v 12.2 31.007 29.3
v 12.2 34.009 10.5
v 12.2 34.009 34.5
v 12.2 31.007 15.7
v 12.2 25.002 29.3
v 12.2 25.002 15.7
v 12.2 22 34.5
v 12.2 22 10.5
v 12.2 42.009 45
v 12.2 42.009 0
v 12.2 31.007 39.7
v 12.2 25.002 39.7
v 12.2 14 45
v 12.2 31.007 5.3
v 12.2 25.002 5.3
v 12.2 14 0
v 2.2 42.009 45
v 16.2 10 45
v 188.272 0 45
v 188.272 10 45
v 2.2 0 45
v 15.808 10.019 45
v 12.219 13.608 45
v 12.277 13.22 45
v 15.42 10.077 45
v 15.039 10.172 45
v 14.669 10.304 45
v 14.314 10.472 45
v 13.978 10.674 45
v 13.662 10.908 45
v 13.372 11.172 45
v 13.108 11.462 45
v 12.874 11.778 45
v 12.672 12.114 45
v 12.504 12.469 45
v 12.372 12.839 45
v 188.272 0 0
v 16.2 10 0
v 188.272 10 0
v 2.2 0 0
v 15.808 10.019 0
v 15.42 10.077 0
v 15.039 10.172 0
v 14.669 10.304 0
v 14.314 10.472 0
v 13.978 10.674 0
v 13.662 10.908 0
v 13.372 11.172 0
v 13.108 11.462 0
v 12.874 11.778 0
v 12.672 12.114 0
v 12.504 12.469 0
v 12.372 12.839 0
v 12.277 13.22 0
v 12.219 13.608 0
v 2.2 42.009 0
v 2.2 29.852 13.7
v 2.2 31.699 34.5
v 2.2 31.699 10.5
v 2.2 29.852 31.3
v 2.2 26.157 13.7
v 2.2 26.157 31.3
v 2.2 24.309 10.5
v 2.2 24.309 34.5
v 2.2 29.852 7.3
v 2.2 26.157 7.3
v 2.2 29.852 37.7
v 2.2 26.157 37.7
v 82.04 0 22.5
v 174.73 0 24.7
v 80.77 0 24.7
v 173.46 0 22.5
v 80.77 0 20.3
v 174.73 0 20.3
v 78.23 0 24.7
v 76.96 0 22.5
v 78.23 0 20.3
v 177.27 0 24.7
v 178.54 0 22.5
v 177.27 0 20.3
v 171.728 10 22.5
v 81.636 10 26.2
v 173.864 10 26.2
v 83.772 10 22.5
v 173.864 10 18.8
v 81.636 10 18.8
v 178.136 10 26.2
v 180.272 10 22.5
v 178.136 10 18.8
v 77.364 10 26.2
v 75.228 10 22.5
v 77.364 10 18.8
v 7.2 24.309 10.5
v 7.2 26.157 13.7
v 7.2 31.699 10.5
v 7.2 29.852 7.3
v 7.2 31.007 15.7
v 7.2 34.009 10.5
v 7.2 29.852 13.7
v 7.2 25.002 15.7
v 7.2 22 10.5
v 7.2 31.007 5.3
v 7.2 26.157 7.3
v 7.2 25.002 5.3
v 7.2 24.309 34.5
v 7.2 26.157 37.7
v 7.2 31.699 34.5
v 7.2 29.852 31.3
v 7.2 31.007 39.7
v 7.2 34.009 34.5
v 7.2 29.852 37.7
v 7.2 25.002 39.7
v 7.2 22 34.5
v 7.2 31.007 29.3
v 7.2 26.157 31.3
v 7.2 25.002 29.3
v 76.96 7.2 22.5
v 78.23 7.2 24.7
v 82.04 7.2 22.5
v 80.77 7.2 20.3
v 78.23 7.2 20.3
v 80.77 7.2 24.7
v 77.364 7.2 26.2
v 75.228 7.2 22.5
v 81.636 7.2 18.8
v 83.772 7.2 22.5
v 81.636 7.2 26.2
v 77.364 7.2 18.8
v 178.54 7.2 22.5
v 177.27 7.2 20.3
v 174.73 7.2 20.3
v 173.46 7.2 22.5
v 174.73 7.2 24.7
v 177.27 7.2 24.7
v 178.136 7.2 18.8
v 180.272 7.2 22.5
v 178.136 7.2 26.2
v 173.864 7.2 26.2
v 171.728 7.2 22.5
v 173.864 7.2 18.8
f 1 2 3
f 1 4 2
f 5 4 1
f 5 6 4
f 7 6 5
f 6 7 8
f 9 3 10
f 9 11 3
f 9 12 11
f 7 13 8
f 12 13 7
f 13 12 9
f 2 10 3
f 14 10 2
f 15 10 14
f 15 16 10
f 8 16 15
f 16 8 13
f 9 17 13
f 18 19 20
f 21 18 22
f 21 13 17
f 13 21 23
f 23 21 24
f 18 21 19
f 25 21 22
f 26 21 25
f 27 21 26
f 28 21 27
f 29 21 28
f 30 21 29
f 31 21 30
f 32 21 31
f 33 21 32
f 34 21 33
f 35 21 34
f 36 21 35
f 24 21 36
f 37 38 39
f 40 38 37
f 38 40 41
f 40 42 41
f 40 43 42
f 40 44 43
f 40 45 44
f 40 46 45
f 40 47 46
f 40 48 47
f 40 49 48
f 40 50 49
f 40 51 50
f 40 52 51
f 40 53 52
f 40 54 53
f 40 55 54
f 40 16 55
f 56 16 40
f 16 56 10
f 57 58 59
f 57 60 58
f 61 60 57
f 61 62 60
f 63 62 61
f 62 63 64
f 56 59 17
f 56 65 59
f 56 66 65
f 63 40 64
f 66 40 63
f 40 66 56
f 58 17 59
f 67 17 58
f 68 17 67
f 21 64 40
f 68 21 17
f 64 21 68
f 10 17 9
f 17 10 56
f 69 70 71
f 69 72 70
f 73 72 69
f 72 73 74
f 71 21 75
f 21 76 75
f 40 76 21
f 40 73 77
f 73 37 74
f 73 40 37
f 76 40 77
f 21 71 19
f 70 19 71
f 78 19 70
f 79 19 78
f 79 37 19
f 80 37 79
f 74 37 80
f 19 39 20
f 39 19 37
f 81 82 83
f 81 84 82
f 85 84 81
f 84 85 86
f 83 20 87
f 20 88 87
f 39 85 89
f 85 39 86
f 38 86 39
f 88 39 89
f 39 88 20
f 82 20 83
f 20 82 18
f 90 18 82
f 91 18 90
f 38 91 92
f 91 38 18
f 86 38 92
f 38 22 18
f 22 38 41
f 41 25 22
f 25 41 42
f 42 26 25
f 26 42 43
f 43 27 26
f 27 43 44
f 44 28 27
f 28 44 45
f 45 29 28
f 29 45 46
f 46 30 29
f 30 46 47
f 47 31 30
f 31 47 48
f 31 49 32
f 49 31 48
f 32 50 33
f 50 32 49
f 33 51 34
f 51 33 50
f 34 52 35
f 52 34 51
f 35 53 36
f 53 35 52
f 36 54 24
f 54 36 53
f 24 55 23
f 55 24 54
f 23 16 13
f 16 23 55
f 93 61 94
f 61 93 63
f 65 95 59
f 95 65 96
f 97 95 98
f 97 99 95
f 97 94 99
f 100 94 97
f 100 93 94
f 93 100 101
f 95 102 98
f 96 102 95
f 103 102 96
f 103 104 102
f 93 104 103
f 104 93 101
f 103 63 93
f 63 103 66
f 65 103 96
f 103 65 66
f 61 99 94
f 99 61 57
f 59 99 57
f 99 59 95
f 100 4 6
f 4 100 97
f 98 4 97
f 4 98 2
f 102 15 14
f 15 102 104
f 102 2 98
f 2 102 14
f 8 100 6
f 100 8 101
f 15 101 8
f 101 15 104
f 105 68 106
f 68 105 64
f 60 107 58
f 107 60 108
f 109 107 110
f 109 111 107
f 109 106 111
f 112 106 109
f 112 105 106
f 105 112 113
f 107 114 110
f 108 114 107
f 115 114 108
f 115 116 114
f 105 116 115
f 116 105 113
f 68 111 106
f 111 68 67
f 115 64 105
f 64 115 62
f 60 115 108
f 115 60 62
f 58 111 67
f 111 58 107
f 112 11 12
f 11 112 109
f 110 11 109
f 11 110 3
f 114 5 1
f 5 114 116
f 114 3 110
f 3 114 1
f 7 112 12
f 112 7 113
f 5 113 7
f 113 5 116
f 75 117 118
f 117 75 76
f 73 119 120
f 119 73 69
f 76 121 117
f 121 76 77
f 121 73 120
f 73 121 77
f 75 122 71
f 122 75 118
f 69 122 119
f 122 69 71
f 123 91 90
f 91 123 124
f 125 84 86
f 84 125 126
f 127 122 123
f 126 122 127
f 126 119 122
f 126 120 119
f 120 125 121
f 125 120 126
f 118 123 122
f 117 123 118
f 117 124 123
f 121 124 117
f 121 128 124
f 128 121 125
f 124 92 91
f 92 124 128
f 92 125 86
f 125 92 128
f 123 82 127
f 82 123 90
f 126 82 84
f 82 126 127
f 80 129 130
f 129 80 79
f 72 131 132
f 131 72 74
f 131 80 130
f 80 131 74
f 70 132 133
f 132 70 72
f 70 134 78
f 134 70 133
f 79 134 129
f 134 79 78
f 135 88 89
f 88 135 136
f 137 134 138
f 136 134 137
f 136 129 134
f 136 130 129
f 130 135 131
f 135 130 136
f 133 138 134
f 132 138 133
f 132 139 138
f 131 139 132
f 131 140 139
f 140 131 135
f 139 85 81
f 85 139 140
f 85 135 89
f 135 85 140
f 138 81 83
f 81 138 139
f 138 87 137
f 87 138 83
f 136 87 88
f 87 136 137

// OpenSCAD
// file: ../../../modules/steel_rack.scad
use <bolts.scad>;

bolt_edge_offset = 15;
bolt_positions = [
  bolt_edge_offset,
  bolt_edge_offset + 98,
  bolt_edge_offset + 98 + 24,
];

module bolt_and_nut(y, h) {
  nut_thickness = 5;
  translate([0, y, h / 2])
    m6_bolt_hole(h + 1, center = true);
  translate([0, y, h - nut_thickness / 2])
    rotate([0, 0, 90])
    m6_nut_trap(nut_thickness, center = true);
}

module long_bar(w, y, h) {
  difference() {
    translate([w / 2, y / 2, h / 2])
      cube([w, y, h], center = true);

    for (x = bolt_positions) {
      translate([x, 0, 0])
        bolt_and_nut(y / 2, h);
    }
  }
}

module short_bar(w, y, h) {
  difference() {
    translate([w / 2, y / 2, h / 2])
      cube([w, y, h], center = true);

    translate([bolt_positions[0], 0, 0])
      bolt_and_nut(y / 2, h);
  }
}

module fillet_profile(r, h) {
  linear_extrude(height = h, center = true)
    difference() {
      square([r, r]);
      circle(r = r, $fn = 64);
    }
}
// file: ../../../modules/bolts.scad
module nut_trap(d, h, center = true) {
  linear_extrude(height = h, center = center)
  circle(d = d / cos(30), $fn = 6);
}

module bolt_hole(d, h, center = true) {
  linear_extrude(height = h, center = center)
  circle(d = d, $fn = 64);
}

// Hex holes for self-tapping (nominal - 0.2mm)
module hex_hole(flat_d, h) {
  linear_extrude(height = h, center = true)
  circle(d = flat_d / cos(30), $fn = 6);
}

module m3_bolt_hexhole(h) {
  rotate([0, 0, 90]) hex_hole(flat_d = 2.8, h = h);
}

module m4_bolt_hexhole(h) {
  rotate([0, 0, 90]) hex_hole(flat_d = 3.8, h = h);
}

module m6_bolt_hexhole(h) {
  rotate([0, 0, 90]) hex_hole(flat_d = 5.8, h = h);
}

module m8_bolt_hexhole(h) {
  rotate([0, 0, 90]) hex_hole(flat_d = 7.8, h = h);
}

// M3
module m3_bolt_hole(h, center = false) { bolt_hole(d = 3.4, h = h, center = center); }
module m3_nut_trap(h, center = false) { nut_trap(d = 5.7, h = h, center = center); }

// M4
module m4_bolt_hole(h, center = false) { bolt_hole(d = 4.4, h = h, center = center); }
module m4_nut_trap(h, center = false) { nut_trap(d = 7.5, h = h, center = center); }

// M6
module m6_bolt_hole(h, center = false) { bolt_hole(d = 6.2, h = h, center = center); }
module m6_nut_trap(h, center = false) { nut_trap(d = 10.2, h = h, center = center); }

// M8
module m8_bolt_hole(h, center = false) { bolt_hole(d = 8.4, h = h, center = center); }
module m8_nut_trap(h, center = false) { nut_trap(d = 13.3, h = h, center = center); }
// file: ../../../modules/slide_rail_outer_bracket.scad
use <bolts.scad>
use <steel_rack.scad>

// スライドレール外側とL字アングルを接合するL字ブラケット。
// 設計の経緯と確定値は ledger/designs/steel-rack-500x400.md が正本。
//
// 座標系 (部品自身の datum):
//   X = 0 がこの部品側のL字アングル外側面。部品はアングル板厚の内側から始まる
//   Y = 0 がスライドレール外側面。+Y がラック外側
//   Z = 0 が部品底面 (レール下端と一致)
// front は screw_x = [37, 101.5]、rear は [79.5, 176] を自分の datum
// から渡す。 M6 が高さ 22.5±12 の対称配置のため部品は Z 反転対称になり、
// 左右のレールにも上下反転するだけで同じ2部品を使い回せる。

bracket_height = 45;
flange_t = 10;
inner_r = 4;
m6_z = [ 10.5, 34.5 ];
// クリアランス基準: 呼び寸法 + 0.4mm (実プリントの嵌合結果から拡大)
m6_pass_flat = 6.4; // M6ボルト通し六角の二面幅 (手前5mm)
m6_nut_flat = 10.4; // M6ナット窪み六角の二面幅 (奥5mm、ナット実測9.8 + 実効0.6)
m6_stage_depth = 5;
screw_z = 22.5;
m4_pass_flat = 4.4; // M4小トラスネジ通し六角の二面幅
m4_nut_flat = 7.4; // M4ナット窪み六角の二面幅 (ナット実測6.8 + 実効0.6)
m4_nut_depth = 2.8; // M4ナット窪みの深さ (user指定)
edge_margin = 8; // 穴の外縁から部品端までの余白 (自由な辺のみ)
angle_t = 2.2; // L字アングルの板厚

// 六角プリズム: 軸X・上下の辺が水平 (flat-up)。
// 天井を短い水平ブリッジにして垂れの改善を狙う
// (point-up だと天井面が水平から30°になり垂れた — 嵌合試験で確認済み)
module
hex_x_flat_up(flat_d, l)
{
    rotate([ 0, 90, 0 ]) rotate([ 0, 0, 90 ]) hex_hole(flat_d = flat_d, h = l);
}

// 六角プリズム: 軸Y・上下の辺が水平 (flat-up)。M6と同じくブリッジ天井
module
hex_y_flat_up(flat_d, l)
{
    rotate([ 90, 0, 0 ]) hex_hole(flat_d = flat_d, h = l);
}

module
slide_rail_outer_bracket(screw_x, name = "bracket")
{
    // flat-up配置では水平方向の穴半径は対角/2 (= 二面幅/(2*cos30))。
    // 8mm余白の契約はこの実半径に対して守る
    m6_nut_diag = m6_nut_flat / cos(30);
    m4_nut_diag = m4_nut_flat / cos(30);
    // 短辺のY寸法: 長辺厚 + 内側R + 余白 + M6六角(対角) + 余白
    m6_y = flange_t + inner_r + edge_margin + m6_nut_diag / 2;
    short_len = m6_y + m6_nut_diag / 2 + edge_margin;
    // 長辺のX終端: 最奥のM4穴の最大断面 (ナット窪みの対角の半分) + 余白
    arm_end = max(screw_x) + m4_nut_diag / 2 + edge_margin;

    echo(str("CONTRACT ", name, ": height = ", bracket_height));
    echo(str("CONTRACT ", name, ": flange_t = ", flange_t));
    echo(str("CONTRACT ", name, ": inner_r = ", inner_r));
    echo(str("CONTRACT ", name, ": m6_z = ", m6_z));
    echo(str("CONTRACT ", name, ": m6_pass_flat = ", m6_pass_flat));
    echo(str("CONTRACT ", name, ": m6_nut_flat = ", m6_nut_flat));
    echo(str("CONTRACT ", name, ": screw_z = ", screw_z));
    echo(str("CONTRACT ", name, ": m4_pass_flat = ", m4_pass_flat));
    echo(str("CONTRACT ", name, ": m4_nut_flat = ", m4_nut_flat));
    echo(str("CONTRACT ", name, ": m4_nut_depth = ", m4_nut_depth));
    echo(str("CONTRACT ", name, ": edge_margin = ", edge_margin));
    echo(str("CONTRACT ", name, ": angle_t = ", angle_t));
    echo(str("CONTRACT ", name, ": screw_x = ", screw_x));
    echo(str("CONTRACT ",
             name,
             ": m6_y = ",
             m6_y,
             ", short_len = ",
             short_len,
             ", arm_end = ",
             arm_end));

    // 余白の契約 (自由な辺のみ。高さ45とM6のZはuser固定値なので対象外)
    assert(m6_y - m6_nut_diag / 2 - (flange_t + inner_r) >= edge_margin,
           "M6 hole too close to the inner corner");
    assert(short_len - (m6_y + m6_nut_diag / 2) >= edge_margin,
           "M6 hole too close to the short-flange edge");
    assert(arm_end - (max(screw_x) + m4_nut_diag / 2) >= edge_margin,
           "M4 hole too close to the arm end");
    assert(min(screw_x) - m4_nut_diag / 2 >= angle_t + flange_t,
           "M4 hole overlaps the short flange");

    difference()
    {
        union()
        {
            // 短辺: アングル内側に当たる縦板 (M6で締結)
            translate([ angle_t, 0, 0 ])
                cube([ flange_t, short_len, bracket_height ]);

            // 長辺: レール外側面に当たる横板 (M4小トラスネジ+ナットで締結)
            translate([ angle_t, 0, 0 ])
                cube([ arm_end - angle_t, flange_t, bracket_height ]);

            // 内側コーナーのR4フィレット (応力集中の回避)
            translate([
                angle_t + flange_t + inner_r,
                flange_t + inner_r,
                bracket_height / 2
            ]) rotate([ 0, 0, 180 ]) fillet_profile(inner_r, bracket_height);
        }

        // M6の2段六角穴 (軸X・flat-up): 手前5mmが通し、奥5mmがナット窪み
        for (z = m6_z) {
            translate([ angle_t + m6_stage_depth / 2 - 0.05, m6_y, z ])
                hex_x_flat_up(m6_pass_flat, m6_stage_depth + 0.1);
            translate(
                [ angle_t + flange_t - m6_stage_depth / 2 + 0.05, m6_y, z ])
                hex_x_flat_up(m6_nut_flat, m6_stage_depth + 0.1);
        }

        // M4小トラスネジの穴 (軸Y・flat-up):
        // 通しは全厚を貫通し、L字の内側面 (y=10) から深さ2.8mmのナット窪み。
        // ネジはレール内側から刺さり
        // (トラス頭はスライダーと干渉しない実測済み)、
        // ナットが窪みの底で受けてレール板とブラケットを共締めする
        for (x = screw_x) {
            translate([ x, flange_t / 2, screw_z ])
                hex_y_flat_up(m4_pass_flat, flange_t + 0.2);
            translate([ x, flange_t - m4_nut_depth / 2 + 0.05, screw_z ])
                hex_y_flat_up(m4_nut_flat, m4_nut_depth + 0.1);
        }
    }
}
// main file
use <../../../modules/slide_rail_outer_bracket.scad>

// スライドレール外側ブラケット (奥)。
// datum: X=0 は奥側L字アングルの外側面 (自分側の基準)。
// ラック手前基準の世界座標では 400 - x で正規化される。
// 印刷向き: L断面をビルドプレートへ寝かせる (層と平行に荷重を受ける)。
// 左右のレールには上下反転で同じ部品を使う (Z対称)。

// 初版 [76.5, 172.5] は実プリントで手前側と同じ座標ズレが判明し、
// 各穴をL字の底面から遠ざかる方向 (+X) へ 1個目+3mm・2個目+3.5mm 補正した
// (経緯は ledger/designs/steel-rack-500x400.md)
screw_x = [ 79.5, 176 ];
rack_depth = 400;

echo(str("CONTRACT rear: screw_x_front_datum = ",
         [ rack_depth - screw_x[1], rack_depth - screw_x[0] ]));

slide_rail_outer_bracket(screw_x = screw_x, name = "rear");
